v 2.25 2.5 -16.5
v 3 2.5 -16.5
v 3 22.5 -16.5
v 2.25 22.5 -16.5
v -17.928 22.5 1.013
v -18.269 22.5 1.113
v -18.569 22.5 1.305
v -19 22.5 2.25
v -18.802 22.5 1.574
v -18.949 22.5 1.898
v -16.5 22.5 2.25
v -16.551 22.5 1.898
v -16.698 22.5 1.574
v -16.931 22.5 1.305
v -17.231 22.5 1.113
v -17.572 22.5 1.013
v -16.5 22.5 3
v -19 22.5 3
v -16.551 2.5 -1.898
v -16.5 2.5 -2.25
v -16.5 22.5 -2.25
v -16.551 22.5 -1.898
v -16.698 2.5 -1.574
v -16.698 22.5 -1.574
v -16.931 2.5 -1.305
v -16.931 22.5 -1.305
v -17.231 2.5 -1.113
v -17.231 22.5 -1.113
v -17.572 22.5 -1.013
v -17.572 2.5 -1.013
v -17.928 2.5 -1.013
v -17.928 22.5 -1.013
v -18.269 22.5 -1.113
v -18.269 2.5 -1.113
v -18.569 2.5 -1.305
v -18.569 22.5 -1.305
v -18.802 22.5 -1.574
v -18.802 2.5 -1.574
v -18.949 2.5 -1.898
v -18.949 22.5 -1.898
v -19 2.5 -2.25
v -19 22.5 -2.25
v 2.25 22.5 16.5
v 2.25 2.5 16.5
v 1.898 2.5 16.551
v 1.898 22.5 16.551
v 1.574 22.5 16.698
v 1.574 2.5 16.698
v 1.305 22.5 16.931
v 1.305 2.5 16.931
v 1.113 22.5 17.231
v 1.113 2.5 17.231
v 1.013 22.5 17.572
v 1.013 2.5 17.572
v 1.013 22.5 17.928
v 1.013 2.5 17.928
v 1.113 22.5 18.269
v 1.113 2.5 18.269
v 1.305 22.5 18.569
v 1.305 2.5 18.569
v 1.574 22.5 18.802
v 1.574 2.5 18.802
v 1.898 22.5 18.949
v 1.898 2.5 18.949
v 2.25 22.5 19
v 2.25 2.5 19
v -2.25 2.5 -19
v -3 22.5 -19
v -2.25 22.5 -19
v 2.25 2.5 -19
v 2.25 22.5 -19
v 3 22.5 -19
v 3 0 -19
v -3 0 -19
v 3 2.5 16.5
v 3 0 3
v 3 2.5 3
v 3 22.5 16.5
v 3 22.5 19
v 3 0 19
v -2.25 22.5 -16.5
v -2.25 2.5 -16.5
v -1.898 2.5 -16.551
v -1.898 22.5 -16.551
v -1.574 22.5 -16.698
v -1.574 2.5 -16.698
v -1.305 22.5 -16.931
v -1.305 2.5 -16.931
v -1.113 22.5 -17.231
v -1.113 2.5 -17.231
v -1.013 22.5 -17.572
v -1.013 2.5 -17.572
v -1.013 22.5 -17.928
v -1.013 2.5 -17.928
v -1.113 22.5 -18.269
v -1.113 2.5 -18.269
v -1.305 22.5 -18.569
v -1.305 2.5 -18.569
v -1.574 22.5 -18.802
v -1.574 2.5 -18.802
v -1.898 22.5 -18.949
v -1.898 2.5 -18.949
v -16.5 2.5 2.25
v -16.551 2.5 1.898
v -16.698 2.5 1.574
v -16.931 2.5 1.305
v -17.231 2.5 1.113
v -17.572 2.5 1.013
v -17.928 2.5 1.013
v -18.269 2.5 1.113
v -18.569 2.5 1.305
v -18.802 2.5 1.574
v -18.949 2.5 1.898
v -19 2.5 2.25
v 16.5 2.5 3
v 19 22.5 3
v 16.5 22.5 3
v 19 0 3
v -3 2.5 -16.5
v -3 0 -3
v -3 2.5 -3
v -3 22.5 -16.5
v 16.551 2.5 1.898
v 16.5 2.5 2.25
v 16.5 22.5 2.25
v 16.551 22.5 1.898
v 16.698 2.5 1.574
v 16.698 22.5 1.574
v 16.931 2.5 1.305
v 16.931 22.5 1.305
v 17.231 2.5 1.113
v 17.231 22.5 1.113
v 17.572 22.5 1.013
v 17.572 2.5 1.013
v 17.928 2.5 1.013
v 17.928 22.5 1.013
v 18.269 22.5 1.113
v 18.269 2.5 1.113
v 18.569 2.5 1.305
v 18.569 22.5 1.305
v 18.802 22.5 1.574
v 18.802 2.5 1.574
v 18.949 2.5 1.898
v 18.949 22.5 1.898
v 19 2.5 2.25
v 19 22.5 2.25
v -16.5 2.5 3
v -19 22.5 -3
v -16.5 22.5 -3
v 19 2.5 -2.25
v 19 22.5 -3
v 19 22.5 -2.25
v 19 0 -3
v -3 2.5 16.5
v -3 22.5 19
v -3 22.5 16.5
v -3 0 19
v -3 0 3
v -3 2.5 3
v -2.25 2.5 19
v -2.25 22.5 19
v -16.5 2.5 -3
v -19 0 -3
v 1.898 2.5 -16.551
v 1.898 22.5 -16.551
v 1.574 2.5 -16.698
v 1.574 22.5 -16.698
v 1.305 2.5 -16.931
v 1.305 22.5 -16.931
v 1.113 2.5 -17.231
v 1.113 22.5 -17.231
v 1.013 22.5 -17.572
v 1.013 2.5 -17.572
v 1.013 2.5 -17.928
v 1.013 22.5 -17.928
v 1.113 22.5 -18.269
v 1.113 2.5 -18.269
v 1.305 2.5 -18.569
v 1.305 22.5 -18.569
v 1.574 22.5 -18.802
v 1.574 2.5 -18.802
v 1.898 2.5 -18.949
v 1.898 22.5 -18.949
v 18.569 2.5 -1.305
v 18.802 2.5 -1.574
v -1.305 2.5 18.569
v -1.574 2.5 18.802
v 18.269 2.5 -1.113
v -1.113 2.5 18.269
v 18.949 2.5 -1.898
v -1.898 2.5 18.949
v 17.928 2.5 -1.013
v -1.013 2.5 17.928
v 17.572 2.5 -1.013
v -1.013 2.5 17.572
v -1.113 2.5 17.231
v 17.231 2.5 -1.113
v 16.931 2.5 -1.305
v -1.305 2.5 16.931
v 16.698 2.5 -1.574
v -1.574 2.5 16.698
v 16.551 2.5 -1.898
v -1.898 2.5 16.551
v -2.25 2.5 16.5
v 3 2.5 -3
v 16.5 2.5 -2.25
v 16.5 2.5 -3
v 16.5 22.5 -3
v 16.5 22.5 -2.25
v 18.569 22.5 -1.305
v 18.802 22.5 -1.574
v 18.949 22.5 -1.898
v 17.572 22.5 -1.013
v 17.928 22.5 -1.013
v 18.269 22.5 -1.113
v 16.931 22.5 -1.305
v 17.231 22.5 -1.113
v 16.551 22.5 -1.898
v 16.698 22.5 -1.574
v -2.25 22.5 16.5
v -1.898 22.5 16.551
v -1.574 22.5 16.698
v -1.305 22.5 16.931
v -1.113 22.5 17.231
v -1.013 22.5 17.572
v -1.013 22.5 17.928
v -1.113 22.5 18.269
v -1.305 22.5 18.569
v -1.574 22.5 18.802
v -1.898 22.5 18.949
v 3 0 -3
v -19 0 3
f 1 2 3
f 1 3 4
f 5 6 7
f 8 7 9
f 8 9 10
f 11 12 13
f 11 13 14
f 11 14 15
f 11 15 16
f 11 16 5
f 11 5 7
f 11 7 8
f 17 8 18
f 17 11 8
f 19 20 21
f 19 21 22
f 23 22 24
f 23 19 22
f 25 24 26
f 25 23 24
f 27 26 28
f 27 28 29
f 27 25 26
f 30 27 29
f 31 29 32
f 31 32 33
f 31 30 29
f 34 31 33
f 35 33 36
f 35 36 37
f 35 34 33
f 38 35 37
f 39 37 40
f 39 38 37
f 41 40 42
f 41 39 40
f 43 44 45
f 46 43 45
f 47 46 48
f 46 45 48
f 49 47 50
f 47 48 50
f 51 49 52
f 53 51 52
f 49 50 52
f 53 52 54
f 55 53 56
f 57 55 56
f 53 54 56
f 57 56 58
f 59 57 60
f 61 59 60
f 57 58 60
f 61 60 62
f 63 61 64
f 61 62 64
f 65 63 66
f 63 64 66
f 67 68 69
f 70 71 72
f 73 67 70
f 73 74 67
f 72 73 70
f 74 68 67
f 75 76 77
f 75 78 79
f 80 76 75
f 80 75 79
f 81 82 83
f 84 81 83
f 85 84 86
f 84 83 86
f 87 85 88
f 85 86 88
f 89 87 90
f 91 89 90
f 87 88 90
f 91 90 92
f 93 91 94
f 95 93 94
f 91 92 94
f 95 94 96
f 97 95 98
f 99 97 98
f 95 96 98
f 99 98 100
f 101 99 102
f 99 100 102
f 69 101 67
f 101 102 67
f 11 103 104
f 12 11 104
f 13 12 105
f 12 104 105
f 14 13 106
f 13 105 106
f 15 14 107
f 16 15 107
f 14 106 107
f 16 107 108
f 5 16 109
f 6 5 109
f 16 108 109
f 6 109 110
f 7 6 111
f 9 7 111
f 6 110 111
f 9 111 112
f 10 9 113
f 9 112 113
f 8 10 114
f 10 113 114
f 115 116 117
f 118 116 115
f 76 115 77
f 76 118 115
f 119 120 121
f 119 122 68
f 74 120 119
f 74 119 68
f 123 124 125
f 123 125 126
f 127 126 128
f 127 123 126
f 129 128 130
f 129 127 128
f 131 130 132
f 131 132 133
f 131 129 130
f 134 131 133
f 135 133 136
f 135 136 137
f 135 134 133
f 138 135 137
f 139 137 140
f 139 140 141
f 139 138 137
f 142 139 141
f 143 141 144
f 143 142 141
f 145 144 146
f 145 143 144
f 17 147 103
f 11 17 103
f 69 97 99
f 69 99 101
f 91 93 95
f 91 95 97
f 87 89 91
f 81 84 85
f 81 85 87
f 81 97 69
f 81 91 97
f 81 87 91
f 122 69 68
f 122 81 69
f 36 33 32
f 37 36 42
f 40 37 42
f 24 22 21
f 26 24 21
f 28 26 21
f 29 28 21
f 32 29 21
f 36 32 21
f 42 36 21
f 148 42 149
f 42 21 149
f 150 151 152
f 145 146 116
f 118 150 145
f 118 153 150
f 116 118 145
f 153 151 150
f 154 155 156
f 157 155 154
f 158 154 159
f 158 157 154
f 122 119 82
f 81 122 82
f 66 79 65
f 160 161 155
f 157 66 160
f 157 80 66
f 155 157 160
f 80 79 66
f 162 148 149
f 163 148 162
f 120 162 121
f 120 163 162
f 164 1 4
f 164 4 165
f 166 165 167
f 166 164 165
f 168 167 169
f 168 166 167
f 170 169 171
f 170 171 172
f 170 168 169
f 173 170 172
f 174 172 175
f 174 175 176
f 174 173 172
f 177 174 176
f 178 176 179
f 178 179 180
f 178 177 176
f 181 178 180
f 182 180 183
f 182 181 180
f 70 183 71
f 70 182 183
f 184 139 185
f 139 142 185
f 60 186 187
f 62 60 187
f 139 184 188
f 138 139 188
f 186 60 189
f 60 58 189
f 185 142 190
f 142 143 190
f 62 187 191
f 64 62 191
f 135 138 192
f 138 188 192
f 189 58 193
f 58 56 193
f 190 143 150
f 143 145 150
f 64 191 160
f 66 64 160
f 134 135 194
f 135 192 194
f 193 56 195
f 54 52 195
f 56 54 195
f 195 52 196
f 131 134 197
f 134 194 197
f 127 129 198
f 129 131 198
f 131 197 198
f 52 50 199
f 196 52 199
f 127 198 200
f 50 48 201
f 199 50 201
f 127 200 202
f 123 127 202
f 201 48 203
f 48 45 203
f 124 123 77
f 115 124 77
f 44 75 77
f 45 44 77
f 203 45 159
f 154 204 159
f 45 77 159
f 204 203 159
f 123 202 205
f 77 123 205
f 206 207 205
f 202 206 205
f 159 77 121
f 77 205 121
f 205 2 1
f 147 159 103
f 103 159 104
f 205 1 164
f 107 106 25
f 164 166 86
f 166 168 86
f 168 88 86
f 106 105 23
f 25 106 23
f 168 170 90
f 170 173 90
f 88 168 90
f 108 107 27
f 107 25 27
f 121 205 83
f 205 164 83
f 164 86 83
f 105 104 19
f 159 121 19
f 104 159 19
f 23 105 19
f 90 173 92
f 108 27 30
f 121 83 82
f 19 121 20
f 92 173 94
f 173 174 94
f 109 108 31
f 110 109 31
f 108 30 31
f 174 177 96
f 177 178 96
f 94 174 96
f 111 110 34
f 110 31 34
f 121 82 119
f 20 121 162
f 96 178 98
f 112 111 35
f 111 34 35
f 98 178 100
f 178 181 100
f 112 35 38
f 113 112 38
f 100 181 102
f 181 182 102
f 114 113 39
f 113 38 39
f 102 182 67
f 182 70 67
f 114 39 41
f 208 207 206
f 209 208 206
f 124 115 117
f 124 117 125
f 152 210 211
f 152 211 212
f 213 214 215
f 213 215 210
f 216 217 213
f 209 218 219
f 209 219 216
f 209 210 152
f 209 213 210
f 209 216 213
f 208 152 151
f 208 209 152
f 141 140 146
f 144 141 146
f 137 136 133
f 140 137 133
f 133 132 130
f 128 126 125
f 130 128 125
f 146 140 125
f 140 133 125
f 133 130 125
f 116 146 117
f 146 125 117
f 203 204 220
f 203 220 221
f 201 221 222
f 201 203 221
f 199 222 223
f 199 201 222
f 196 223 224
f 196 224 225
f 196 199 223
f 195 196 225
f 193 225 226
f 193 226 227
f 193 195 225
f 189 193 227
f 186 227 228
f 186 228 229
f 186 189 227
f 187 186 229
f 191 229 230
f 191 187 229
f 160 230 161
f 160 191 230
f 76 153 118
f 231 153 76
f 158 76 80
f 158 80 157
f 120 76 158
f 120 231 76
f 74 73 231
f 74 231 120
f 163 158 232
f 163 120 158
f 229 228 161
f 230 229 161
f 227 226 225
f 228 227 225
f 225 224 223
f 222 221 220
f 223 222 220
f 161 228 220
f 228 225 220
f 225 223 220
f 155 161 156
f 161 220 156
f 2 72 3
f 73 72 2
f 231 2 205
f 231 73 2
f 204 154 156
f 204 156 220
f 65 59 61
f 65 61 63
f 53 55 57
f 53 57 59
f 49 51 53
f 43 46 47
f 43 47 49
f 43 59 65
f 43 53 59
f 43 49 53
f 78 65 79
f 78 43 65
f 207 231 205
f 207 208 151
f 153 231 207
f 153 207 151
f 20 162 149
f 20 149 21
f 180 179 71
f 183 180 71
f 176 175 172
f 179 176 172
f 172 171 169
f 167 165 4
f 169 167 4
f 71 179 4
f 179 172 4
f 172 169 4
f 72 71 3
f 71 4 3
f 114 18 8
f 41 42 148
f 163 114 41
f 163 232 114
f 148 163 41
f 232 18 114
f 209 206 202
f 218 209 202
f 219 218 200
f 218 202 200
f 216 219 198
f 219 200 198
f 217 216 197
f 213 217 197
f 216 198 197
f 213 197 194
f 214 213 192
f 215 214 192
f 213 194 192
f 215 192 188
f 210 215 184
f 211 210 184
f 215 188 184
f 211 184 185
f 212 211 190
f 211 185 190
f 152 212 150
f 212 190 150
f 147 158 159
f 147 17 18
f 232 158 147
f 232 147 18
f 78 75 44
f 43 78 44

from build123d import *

# Parameters (mm, degrees)
BOSS_EXTRUDE1_DEPTH = 2.5
BOSS_EXTRUDE2_DEPTH = 20
CIRPATTERN1_COUNT   = 4


with BuildPart() as part:
    # Sketch1 → Boss-Extrude1 (new body)
    with BuildSketch(Plane(origin=(0, 0, 0), x_dir=(1, 0, 0), z_dir=(0, 1, 0))):
        Polygon((-3, 3), (-3, 19), (3, 19), (3, 3), (19, 3), (19, -3), (3, -3), (3, -19), (-3, -19), (-3, -3), (-19, -3), (-19, 3), align=None)
    extrude(amount=BOSS_EXTRUDE1_DEPTH)

    # Sketch2 → Boss-Extrude2 (add)
    with BuildSketch(Plane(origin=(0, 2.5, 0), x_dir=(1, 0, 0), z_dir=(0, 1, 0))):
        with BuildLine():
            Line((-2.25, -19), (-3, -19))
            Line((-3, -19), (-3, -16.5))
            Line((-3, -16.5), (-2.25, -16.5))
            ThreePointArc((-2.25, -16.5), (-1, -17.75), (-2.25, -19))
        make_face()
        with BuildLine():
            Line((3, -16.5), (2.25, -16.5))
            ThreePointArc((2.25, -16.5), (1, -17.75), (2.25, -19))
            Line((2.25, -19), (3, -19))
            Line((3, -19), (3, -16.5))
        make_face()
    boss_extrude2 = extrude(amount=BOSS_EXTRUDE2_DEPTH)

    # CirPattern1: Boss-Extrude2 ×4 about axis
    cirpattern1_axis = Axis((0, 0, 0), (0, 1, 0))
    for i in range(1, CIRPATTERN1_COUNT):
        add(boss_extrude2.rotate(cirpattern1_axis, i * 360 / CIRPATTERN1_COUNT))


solid = part.part
